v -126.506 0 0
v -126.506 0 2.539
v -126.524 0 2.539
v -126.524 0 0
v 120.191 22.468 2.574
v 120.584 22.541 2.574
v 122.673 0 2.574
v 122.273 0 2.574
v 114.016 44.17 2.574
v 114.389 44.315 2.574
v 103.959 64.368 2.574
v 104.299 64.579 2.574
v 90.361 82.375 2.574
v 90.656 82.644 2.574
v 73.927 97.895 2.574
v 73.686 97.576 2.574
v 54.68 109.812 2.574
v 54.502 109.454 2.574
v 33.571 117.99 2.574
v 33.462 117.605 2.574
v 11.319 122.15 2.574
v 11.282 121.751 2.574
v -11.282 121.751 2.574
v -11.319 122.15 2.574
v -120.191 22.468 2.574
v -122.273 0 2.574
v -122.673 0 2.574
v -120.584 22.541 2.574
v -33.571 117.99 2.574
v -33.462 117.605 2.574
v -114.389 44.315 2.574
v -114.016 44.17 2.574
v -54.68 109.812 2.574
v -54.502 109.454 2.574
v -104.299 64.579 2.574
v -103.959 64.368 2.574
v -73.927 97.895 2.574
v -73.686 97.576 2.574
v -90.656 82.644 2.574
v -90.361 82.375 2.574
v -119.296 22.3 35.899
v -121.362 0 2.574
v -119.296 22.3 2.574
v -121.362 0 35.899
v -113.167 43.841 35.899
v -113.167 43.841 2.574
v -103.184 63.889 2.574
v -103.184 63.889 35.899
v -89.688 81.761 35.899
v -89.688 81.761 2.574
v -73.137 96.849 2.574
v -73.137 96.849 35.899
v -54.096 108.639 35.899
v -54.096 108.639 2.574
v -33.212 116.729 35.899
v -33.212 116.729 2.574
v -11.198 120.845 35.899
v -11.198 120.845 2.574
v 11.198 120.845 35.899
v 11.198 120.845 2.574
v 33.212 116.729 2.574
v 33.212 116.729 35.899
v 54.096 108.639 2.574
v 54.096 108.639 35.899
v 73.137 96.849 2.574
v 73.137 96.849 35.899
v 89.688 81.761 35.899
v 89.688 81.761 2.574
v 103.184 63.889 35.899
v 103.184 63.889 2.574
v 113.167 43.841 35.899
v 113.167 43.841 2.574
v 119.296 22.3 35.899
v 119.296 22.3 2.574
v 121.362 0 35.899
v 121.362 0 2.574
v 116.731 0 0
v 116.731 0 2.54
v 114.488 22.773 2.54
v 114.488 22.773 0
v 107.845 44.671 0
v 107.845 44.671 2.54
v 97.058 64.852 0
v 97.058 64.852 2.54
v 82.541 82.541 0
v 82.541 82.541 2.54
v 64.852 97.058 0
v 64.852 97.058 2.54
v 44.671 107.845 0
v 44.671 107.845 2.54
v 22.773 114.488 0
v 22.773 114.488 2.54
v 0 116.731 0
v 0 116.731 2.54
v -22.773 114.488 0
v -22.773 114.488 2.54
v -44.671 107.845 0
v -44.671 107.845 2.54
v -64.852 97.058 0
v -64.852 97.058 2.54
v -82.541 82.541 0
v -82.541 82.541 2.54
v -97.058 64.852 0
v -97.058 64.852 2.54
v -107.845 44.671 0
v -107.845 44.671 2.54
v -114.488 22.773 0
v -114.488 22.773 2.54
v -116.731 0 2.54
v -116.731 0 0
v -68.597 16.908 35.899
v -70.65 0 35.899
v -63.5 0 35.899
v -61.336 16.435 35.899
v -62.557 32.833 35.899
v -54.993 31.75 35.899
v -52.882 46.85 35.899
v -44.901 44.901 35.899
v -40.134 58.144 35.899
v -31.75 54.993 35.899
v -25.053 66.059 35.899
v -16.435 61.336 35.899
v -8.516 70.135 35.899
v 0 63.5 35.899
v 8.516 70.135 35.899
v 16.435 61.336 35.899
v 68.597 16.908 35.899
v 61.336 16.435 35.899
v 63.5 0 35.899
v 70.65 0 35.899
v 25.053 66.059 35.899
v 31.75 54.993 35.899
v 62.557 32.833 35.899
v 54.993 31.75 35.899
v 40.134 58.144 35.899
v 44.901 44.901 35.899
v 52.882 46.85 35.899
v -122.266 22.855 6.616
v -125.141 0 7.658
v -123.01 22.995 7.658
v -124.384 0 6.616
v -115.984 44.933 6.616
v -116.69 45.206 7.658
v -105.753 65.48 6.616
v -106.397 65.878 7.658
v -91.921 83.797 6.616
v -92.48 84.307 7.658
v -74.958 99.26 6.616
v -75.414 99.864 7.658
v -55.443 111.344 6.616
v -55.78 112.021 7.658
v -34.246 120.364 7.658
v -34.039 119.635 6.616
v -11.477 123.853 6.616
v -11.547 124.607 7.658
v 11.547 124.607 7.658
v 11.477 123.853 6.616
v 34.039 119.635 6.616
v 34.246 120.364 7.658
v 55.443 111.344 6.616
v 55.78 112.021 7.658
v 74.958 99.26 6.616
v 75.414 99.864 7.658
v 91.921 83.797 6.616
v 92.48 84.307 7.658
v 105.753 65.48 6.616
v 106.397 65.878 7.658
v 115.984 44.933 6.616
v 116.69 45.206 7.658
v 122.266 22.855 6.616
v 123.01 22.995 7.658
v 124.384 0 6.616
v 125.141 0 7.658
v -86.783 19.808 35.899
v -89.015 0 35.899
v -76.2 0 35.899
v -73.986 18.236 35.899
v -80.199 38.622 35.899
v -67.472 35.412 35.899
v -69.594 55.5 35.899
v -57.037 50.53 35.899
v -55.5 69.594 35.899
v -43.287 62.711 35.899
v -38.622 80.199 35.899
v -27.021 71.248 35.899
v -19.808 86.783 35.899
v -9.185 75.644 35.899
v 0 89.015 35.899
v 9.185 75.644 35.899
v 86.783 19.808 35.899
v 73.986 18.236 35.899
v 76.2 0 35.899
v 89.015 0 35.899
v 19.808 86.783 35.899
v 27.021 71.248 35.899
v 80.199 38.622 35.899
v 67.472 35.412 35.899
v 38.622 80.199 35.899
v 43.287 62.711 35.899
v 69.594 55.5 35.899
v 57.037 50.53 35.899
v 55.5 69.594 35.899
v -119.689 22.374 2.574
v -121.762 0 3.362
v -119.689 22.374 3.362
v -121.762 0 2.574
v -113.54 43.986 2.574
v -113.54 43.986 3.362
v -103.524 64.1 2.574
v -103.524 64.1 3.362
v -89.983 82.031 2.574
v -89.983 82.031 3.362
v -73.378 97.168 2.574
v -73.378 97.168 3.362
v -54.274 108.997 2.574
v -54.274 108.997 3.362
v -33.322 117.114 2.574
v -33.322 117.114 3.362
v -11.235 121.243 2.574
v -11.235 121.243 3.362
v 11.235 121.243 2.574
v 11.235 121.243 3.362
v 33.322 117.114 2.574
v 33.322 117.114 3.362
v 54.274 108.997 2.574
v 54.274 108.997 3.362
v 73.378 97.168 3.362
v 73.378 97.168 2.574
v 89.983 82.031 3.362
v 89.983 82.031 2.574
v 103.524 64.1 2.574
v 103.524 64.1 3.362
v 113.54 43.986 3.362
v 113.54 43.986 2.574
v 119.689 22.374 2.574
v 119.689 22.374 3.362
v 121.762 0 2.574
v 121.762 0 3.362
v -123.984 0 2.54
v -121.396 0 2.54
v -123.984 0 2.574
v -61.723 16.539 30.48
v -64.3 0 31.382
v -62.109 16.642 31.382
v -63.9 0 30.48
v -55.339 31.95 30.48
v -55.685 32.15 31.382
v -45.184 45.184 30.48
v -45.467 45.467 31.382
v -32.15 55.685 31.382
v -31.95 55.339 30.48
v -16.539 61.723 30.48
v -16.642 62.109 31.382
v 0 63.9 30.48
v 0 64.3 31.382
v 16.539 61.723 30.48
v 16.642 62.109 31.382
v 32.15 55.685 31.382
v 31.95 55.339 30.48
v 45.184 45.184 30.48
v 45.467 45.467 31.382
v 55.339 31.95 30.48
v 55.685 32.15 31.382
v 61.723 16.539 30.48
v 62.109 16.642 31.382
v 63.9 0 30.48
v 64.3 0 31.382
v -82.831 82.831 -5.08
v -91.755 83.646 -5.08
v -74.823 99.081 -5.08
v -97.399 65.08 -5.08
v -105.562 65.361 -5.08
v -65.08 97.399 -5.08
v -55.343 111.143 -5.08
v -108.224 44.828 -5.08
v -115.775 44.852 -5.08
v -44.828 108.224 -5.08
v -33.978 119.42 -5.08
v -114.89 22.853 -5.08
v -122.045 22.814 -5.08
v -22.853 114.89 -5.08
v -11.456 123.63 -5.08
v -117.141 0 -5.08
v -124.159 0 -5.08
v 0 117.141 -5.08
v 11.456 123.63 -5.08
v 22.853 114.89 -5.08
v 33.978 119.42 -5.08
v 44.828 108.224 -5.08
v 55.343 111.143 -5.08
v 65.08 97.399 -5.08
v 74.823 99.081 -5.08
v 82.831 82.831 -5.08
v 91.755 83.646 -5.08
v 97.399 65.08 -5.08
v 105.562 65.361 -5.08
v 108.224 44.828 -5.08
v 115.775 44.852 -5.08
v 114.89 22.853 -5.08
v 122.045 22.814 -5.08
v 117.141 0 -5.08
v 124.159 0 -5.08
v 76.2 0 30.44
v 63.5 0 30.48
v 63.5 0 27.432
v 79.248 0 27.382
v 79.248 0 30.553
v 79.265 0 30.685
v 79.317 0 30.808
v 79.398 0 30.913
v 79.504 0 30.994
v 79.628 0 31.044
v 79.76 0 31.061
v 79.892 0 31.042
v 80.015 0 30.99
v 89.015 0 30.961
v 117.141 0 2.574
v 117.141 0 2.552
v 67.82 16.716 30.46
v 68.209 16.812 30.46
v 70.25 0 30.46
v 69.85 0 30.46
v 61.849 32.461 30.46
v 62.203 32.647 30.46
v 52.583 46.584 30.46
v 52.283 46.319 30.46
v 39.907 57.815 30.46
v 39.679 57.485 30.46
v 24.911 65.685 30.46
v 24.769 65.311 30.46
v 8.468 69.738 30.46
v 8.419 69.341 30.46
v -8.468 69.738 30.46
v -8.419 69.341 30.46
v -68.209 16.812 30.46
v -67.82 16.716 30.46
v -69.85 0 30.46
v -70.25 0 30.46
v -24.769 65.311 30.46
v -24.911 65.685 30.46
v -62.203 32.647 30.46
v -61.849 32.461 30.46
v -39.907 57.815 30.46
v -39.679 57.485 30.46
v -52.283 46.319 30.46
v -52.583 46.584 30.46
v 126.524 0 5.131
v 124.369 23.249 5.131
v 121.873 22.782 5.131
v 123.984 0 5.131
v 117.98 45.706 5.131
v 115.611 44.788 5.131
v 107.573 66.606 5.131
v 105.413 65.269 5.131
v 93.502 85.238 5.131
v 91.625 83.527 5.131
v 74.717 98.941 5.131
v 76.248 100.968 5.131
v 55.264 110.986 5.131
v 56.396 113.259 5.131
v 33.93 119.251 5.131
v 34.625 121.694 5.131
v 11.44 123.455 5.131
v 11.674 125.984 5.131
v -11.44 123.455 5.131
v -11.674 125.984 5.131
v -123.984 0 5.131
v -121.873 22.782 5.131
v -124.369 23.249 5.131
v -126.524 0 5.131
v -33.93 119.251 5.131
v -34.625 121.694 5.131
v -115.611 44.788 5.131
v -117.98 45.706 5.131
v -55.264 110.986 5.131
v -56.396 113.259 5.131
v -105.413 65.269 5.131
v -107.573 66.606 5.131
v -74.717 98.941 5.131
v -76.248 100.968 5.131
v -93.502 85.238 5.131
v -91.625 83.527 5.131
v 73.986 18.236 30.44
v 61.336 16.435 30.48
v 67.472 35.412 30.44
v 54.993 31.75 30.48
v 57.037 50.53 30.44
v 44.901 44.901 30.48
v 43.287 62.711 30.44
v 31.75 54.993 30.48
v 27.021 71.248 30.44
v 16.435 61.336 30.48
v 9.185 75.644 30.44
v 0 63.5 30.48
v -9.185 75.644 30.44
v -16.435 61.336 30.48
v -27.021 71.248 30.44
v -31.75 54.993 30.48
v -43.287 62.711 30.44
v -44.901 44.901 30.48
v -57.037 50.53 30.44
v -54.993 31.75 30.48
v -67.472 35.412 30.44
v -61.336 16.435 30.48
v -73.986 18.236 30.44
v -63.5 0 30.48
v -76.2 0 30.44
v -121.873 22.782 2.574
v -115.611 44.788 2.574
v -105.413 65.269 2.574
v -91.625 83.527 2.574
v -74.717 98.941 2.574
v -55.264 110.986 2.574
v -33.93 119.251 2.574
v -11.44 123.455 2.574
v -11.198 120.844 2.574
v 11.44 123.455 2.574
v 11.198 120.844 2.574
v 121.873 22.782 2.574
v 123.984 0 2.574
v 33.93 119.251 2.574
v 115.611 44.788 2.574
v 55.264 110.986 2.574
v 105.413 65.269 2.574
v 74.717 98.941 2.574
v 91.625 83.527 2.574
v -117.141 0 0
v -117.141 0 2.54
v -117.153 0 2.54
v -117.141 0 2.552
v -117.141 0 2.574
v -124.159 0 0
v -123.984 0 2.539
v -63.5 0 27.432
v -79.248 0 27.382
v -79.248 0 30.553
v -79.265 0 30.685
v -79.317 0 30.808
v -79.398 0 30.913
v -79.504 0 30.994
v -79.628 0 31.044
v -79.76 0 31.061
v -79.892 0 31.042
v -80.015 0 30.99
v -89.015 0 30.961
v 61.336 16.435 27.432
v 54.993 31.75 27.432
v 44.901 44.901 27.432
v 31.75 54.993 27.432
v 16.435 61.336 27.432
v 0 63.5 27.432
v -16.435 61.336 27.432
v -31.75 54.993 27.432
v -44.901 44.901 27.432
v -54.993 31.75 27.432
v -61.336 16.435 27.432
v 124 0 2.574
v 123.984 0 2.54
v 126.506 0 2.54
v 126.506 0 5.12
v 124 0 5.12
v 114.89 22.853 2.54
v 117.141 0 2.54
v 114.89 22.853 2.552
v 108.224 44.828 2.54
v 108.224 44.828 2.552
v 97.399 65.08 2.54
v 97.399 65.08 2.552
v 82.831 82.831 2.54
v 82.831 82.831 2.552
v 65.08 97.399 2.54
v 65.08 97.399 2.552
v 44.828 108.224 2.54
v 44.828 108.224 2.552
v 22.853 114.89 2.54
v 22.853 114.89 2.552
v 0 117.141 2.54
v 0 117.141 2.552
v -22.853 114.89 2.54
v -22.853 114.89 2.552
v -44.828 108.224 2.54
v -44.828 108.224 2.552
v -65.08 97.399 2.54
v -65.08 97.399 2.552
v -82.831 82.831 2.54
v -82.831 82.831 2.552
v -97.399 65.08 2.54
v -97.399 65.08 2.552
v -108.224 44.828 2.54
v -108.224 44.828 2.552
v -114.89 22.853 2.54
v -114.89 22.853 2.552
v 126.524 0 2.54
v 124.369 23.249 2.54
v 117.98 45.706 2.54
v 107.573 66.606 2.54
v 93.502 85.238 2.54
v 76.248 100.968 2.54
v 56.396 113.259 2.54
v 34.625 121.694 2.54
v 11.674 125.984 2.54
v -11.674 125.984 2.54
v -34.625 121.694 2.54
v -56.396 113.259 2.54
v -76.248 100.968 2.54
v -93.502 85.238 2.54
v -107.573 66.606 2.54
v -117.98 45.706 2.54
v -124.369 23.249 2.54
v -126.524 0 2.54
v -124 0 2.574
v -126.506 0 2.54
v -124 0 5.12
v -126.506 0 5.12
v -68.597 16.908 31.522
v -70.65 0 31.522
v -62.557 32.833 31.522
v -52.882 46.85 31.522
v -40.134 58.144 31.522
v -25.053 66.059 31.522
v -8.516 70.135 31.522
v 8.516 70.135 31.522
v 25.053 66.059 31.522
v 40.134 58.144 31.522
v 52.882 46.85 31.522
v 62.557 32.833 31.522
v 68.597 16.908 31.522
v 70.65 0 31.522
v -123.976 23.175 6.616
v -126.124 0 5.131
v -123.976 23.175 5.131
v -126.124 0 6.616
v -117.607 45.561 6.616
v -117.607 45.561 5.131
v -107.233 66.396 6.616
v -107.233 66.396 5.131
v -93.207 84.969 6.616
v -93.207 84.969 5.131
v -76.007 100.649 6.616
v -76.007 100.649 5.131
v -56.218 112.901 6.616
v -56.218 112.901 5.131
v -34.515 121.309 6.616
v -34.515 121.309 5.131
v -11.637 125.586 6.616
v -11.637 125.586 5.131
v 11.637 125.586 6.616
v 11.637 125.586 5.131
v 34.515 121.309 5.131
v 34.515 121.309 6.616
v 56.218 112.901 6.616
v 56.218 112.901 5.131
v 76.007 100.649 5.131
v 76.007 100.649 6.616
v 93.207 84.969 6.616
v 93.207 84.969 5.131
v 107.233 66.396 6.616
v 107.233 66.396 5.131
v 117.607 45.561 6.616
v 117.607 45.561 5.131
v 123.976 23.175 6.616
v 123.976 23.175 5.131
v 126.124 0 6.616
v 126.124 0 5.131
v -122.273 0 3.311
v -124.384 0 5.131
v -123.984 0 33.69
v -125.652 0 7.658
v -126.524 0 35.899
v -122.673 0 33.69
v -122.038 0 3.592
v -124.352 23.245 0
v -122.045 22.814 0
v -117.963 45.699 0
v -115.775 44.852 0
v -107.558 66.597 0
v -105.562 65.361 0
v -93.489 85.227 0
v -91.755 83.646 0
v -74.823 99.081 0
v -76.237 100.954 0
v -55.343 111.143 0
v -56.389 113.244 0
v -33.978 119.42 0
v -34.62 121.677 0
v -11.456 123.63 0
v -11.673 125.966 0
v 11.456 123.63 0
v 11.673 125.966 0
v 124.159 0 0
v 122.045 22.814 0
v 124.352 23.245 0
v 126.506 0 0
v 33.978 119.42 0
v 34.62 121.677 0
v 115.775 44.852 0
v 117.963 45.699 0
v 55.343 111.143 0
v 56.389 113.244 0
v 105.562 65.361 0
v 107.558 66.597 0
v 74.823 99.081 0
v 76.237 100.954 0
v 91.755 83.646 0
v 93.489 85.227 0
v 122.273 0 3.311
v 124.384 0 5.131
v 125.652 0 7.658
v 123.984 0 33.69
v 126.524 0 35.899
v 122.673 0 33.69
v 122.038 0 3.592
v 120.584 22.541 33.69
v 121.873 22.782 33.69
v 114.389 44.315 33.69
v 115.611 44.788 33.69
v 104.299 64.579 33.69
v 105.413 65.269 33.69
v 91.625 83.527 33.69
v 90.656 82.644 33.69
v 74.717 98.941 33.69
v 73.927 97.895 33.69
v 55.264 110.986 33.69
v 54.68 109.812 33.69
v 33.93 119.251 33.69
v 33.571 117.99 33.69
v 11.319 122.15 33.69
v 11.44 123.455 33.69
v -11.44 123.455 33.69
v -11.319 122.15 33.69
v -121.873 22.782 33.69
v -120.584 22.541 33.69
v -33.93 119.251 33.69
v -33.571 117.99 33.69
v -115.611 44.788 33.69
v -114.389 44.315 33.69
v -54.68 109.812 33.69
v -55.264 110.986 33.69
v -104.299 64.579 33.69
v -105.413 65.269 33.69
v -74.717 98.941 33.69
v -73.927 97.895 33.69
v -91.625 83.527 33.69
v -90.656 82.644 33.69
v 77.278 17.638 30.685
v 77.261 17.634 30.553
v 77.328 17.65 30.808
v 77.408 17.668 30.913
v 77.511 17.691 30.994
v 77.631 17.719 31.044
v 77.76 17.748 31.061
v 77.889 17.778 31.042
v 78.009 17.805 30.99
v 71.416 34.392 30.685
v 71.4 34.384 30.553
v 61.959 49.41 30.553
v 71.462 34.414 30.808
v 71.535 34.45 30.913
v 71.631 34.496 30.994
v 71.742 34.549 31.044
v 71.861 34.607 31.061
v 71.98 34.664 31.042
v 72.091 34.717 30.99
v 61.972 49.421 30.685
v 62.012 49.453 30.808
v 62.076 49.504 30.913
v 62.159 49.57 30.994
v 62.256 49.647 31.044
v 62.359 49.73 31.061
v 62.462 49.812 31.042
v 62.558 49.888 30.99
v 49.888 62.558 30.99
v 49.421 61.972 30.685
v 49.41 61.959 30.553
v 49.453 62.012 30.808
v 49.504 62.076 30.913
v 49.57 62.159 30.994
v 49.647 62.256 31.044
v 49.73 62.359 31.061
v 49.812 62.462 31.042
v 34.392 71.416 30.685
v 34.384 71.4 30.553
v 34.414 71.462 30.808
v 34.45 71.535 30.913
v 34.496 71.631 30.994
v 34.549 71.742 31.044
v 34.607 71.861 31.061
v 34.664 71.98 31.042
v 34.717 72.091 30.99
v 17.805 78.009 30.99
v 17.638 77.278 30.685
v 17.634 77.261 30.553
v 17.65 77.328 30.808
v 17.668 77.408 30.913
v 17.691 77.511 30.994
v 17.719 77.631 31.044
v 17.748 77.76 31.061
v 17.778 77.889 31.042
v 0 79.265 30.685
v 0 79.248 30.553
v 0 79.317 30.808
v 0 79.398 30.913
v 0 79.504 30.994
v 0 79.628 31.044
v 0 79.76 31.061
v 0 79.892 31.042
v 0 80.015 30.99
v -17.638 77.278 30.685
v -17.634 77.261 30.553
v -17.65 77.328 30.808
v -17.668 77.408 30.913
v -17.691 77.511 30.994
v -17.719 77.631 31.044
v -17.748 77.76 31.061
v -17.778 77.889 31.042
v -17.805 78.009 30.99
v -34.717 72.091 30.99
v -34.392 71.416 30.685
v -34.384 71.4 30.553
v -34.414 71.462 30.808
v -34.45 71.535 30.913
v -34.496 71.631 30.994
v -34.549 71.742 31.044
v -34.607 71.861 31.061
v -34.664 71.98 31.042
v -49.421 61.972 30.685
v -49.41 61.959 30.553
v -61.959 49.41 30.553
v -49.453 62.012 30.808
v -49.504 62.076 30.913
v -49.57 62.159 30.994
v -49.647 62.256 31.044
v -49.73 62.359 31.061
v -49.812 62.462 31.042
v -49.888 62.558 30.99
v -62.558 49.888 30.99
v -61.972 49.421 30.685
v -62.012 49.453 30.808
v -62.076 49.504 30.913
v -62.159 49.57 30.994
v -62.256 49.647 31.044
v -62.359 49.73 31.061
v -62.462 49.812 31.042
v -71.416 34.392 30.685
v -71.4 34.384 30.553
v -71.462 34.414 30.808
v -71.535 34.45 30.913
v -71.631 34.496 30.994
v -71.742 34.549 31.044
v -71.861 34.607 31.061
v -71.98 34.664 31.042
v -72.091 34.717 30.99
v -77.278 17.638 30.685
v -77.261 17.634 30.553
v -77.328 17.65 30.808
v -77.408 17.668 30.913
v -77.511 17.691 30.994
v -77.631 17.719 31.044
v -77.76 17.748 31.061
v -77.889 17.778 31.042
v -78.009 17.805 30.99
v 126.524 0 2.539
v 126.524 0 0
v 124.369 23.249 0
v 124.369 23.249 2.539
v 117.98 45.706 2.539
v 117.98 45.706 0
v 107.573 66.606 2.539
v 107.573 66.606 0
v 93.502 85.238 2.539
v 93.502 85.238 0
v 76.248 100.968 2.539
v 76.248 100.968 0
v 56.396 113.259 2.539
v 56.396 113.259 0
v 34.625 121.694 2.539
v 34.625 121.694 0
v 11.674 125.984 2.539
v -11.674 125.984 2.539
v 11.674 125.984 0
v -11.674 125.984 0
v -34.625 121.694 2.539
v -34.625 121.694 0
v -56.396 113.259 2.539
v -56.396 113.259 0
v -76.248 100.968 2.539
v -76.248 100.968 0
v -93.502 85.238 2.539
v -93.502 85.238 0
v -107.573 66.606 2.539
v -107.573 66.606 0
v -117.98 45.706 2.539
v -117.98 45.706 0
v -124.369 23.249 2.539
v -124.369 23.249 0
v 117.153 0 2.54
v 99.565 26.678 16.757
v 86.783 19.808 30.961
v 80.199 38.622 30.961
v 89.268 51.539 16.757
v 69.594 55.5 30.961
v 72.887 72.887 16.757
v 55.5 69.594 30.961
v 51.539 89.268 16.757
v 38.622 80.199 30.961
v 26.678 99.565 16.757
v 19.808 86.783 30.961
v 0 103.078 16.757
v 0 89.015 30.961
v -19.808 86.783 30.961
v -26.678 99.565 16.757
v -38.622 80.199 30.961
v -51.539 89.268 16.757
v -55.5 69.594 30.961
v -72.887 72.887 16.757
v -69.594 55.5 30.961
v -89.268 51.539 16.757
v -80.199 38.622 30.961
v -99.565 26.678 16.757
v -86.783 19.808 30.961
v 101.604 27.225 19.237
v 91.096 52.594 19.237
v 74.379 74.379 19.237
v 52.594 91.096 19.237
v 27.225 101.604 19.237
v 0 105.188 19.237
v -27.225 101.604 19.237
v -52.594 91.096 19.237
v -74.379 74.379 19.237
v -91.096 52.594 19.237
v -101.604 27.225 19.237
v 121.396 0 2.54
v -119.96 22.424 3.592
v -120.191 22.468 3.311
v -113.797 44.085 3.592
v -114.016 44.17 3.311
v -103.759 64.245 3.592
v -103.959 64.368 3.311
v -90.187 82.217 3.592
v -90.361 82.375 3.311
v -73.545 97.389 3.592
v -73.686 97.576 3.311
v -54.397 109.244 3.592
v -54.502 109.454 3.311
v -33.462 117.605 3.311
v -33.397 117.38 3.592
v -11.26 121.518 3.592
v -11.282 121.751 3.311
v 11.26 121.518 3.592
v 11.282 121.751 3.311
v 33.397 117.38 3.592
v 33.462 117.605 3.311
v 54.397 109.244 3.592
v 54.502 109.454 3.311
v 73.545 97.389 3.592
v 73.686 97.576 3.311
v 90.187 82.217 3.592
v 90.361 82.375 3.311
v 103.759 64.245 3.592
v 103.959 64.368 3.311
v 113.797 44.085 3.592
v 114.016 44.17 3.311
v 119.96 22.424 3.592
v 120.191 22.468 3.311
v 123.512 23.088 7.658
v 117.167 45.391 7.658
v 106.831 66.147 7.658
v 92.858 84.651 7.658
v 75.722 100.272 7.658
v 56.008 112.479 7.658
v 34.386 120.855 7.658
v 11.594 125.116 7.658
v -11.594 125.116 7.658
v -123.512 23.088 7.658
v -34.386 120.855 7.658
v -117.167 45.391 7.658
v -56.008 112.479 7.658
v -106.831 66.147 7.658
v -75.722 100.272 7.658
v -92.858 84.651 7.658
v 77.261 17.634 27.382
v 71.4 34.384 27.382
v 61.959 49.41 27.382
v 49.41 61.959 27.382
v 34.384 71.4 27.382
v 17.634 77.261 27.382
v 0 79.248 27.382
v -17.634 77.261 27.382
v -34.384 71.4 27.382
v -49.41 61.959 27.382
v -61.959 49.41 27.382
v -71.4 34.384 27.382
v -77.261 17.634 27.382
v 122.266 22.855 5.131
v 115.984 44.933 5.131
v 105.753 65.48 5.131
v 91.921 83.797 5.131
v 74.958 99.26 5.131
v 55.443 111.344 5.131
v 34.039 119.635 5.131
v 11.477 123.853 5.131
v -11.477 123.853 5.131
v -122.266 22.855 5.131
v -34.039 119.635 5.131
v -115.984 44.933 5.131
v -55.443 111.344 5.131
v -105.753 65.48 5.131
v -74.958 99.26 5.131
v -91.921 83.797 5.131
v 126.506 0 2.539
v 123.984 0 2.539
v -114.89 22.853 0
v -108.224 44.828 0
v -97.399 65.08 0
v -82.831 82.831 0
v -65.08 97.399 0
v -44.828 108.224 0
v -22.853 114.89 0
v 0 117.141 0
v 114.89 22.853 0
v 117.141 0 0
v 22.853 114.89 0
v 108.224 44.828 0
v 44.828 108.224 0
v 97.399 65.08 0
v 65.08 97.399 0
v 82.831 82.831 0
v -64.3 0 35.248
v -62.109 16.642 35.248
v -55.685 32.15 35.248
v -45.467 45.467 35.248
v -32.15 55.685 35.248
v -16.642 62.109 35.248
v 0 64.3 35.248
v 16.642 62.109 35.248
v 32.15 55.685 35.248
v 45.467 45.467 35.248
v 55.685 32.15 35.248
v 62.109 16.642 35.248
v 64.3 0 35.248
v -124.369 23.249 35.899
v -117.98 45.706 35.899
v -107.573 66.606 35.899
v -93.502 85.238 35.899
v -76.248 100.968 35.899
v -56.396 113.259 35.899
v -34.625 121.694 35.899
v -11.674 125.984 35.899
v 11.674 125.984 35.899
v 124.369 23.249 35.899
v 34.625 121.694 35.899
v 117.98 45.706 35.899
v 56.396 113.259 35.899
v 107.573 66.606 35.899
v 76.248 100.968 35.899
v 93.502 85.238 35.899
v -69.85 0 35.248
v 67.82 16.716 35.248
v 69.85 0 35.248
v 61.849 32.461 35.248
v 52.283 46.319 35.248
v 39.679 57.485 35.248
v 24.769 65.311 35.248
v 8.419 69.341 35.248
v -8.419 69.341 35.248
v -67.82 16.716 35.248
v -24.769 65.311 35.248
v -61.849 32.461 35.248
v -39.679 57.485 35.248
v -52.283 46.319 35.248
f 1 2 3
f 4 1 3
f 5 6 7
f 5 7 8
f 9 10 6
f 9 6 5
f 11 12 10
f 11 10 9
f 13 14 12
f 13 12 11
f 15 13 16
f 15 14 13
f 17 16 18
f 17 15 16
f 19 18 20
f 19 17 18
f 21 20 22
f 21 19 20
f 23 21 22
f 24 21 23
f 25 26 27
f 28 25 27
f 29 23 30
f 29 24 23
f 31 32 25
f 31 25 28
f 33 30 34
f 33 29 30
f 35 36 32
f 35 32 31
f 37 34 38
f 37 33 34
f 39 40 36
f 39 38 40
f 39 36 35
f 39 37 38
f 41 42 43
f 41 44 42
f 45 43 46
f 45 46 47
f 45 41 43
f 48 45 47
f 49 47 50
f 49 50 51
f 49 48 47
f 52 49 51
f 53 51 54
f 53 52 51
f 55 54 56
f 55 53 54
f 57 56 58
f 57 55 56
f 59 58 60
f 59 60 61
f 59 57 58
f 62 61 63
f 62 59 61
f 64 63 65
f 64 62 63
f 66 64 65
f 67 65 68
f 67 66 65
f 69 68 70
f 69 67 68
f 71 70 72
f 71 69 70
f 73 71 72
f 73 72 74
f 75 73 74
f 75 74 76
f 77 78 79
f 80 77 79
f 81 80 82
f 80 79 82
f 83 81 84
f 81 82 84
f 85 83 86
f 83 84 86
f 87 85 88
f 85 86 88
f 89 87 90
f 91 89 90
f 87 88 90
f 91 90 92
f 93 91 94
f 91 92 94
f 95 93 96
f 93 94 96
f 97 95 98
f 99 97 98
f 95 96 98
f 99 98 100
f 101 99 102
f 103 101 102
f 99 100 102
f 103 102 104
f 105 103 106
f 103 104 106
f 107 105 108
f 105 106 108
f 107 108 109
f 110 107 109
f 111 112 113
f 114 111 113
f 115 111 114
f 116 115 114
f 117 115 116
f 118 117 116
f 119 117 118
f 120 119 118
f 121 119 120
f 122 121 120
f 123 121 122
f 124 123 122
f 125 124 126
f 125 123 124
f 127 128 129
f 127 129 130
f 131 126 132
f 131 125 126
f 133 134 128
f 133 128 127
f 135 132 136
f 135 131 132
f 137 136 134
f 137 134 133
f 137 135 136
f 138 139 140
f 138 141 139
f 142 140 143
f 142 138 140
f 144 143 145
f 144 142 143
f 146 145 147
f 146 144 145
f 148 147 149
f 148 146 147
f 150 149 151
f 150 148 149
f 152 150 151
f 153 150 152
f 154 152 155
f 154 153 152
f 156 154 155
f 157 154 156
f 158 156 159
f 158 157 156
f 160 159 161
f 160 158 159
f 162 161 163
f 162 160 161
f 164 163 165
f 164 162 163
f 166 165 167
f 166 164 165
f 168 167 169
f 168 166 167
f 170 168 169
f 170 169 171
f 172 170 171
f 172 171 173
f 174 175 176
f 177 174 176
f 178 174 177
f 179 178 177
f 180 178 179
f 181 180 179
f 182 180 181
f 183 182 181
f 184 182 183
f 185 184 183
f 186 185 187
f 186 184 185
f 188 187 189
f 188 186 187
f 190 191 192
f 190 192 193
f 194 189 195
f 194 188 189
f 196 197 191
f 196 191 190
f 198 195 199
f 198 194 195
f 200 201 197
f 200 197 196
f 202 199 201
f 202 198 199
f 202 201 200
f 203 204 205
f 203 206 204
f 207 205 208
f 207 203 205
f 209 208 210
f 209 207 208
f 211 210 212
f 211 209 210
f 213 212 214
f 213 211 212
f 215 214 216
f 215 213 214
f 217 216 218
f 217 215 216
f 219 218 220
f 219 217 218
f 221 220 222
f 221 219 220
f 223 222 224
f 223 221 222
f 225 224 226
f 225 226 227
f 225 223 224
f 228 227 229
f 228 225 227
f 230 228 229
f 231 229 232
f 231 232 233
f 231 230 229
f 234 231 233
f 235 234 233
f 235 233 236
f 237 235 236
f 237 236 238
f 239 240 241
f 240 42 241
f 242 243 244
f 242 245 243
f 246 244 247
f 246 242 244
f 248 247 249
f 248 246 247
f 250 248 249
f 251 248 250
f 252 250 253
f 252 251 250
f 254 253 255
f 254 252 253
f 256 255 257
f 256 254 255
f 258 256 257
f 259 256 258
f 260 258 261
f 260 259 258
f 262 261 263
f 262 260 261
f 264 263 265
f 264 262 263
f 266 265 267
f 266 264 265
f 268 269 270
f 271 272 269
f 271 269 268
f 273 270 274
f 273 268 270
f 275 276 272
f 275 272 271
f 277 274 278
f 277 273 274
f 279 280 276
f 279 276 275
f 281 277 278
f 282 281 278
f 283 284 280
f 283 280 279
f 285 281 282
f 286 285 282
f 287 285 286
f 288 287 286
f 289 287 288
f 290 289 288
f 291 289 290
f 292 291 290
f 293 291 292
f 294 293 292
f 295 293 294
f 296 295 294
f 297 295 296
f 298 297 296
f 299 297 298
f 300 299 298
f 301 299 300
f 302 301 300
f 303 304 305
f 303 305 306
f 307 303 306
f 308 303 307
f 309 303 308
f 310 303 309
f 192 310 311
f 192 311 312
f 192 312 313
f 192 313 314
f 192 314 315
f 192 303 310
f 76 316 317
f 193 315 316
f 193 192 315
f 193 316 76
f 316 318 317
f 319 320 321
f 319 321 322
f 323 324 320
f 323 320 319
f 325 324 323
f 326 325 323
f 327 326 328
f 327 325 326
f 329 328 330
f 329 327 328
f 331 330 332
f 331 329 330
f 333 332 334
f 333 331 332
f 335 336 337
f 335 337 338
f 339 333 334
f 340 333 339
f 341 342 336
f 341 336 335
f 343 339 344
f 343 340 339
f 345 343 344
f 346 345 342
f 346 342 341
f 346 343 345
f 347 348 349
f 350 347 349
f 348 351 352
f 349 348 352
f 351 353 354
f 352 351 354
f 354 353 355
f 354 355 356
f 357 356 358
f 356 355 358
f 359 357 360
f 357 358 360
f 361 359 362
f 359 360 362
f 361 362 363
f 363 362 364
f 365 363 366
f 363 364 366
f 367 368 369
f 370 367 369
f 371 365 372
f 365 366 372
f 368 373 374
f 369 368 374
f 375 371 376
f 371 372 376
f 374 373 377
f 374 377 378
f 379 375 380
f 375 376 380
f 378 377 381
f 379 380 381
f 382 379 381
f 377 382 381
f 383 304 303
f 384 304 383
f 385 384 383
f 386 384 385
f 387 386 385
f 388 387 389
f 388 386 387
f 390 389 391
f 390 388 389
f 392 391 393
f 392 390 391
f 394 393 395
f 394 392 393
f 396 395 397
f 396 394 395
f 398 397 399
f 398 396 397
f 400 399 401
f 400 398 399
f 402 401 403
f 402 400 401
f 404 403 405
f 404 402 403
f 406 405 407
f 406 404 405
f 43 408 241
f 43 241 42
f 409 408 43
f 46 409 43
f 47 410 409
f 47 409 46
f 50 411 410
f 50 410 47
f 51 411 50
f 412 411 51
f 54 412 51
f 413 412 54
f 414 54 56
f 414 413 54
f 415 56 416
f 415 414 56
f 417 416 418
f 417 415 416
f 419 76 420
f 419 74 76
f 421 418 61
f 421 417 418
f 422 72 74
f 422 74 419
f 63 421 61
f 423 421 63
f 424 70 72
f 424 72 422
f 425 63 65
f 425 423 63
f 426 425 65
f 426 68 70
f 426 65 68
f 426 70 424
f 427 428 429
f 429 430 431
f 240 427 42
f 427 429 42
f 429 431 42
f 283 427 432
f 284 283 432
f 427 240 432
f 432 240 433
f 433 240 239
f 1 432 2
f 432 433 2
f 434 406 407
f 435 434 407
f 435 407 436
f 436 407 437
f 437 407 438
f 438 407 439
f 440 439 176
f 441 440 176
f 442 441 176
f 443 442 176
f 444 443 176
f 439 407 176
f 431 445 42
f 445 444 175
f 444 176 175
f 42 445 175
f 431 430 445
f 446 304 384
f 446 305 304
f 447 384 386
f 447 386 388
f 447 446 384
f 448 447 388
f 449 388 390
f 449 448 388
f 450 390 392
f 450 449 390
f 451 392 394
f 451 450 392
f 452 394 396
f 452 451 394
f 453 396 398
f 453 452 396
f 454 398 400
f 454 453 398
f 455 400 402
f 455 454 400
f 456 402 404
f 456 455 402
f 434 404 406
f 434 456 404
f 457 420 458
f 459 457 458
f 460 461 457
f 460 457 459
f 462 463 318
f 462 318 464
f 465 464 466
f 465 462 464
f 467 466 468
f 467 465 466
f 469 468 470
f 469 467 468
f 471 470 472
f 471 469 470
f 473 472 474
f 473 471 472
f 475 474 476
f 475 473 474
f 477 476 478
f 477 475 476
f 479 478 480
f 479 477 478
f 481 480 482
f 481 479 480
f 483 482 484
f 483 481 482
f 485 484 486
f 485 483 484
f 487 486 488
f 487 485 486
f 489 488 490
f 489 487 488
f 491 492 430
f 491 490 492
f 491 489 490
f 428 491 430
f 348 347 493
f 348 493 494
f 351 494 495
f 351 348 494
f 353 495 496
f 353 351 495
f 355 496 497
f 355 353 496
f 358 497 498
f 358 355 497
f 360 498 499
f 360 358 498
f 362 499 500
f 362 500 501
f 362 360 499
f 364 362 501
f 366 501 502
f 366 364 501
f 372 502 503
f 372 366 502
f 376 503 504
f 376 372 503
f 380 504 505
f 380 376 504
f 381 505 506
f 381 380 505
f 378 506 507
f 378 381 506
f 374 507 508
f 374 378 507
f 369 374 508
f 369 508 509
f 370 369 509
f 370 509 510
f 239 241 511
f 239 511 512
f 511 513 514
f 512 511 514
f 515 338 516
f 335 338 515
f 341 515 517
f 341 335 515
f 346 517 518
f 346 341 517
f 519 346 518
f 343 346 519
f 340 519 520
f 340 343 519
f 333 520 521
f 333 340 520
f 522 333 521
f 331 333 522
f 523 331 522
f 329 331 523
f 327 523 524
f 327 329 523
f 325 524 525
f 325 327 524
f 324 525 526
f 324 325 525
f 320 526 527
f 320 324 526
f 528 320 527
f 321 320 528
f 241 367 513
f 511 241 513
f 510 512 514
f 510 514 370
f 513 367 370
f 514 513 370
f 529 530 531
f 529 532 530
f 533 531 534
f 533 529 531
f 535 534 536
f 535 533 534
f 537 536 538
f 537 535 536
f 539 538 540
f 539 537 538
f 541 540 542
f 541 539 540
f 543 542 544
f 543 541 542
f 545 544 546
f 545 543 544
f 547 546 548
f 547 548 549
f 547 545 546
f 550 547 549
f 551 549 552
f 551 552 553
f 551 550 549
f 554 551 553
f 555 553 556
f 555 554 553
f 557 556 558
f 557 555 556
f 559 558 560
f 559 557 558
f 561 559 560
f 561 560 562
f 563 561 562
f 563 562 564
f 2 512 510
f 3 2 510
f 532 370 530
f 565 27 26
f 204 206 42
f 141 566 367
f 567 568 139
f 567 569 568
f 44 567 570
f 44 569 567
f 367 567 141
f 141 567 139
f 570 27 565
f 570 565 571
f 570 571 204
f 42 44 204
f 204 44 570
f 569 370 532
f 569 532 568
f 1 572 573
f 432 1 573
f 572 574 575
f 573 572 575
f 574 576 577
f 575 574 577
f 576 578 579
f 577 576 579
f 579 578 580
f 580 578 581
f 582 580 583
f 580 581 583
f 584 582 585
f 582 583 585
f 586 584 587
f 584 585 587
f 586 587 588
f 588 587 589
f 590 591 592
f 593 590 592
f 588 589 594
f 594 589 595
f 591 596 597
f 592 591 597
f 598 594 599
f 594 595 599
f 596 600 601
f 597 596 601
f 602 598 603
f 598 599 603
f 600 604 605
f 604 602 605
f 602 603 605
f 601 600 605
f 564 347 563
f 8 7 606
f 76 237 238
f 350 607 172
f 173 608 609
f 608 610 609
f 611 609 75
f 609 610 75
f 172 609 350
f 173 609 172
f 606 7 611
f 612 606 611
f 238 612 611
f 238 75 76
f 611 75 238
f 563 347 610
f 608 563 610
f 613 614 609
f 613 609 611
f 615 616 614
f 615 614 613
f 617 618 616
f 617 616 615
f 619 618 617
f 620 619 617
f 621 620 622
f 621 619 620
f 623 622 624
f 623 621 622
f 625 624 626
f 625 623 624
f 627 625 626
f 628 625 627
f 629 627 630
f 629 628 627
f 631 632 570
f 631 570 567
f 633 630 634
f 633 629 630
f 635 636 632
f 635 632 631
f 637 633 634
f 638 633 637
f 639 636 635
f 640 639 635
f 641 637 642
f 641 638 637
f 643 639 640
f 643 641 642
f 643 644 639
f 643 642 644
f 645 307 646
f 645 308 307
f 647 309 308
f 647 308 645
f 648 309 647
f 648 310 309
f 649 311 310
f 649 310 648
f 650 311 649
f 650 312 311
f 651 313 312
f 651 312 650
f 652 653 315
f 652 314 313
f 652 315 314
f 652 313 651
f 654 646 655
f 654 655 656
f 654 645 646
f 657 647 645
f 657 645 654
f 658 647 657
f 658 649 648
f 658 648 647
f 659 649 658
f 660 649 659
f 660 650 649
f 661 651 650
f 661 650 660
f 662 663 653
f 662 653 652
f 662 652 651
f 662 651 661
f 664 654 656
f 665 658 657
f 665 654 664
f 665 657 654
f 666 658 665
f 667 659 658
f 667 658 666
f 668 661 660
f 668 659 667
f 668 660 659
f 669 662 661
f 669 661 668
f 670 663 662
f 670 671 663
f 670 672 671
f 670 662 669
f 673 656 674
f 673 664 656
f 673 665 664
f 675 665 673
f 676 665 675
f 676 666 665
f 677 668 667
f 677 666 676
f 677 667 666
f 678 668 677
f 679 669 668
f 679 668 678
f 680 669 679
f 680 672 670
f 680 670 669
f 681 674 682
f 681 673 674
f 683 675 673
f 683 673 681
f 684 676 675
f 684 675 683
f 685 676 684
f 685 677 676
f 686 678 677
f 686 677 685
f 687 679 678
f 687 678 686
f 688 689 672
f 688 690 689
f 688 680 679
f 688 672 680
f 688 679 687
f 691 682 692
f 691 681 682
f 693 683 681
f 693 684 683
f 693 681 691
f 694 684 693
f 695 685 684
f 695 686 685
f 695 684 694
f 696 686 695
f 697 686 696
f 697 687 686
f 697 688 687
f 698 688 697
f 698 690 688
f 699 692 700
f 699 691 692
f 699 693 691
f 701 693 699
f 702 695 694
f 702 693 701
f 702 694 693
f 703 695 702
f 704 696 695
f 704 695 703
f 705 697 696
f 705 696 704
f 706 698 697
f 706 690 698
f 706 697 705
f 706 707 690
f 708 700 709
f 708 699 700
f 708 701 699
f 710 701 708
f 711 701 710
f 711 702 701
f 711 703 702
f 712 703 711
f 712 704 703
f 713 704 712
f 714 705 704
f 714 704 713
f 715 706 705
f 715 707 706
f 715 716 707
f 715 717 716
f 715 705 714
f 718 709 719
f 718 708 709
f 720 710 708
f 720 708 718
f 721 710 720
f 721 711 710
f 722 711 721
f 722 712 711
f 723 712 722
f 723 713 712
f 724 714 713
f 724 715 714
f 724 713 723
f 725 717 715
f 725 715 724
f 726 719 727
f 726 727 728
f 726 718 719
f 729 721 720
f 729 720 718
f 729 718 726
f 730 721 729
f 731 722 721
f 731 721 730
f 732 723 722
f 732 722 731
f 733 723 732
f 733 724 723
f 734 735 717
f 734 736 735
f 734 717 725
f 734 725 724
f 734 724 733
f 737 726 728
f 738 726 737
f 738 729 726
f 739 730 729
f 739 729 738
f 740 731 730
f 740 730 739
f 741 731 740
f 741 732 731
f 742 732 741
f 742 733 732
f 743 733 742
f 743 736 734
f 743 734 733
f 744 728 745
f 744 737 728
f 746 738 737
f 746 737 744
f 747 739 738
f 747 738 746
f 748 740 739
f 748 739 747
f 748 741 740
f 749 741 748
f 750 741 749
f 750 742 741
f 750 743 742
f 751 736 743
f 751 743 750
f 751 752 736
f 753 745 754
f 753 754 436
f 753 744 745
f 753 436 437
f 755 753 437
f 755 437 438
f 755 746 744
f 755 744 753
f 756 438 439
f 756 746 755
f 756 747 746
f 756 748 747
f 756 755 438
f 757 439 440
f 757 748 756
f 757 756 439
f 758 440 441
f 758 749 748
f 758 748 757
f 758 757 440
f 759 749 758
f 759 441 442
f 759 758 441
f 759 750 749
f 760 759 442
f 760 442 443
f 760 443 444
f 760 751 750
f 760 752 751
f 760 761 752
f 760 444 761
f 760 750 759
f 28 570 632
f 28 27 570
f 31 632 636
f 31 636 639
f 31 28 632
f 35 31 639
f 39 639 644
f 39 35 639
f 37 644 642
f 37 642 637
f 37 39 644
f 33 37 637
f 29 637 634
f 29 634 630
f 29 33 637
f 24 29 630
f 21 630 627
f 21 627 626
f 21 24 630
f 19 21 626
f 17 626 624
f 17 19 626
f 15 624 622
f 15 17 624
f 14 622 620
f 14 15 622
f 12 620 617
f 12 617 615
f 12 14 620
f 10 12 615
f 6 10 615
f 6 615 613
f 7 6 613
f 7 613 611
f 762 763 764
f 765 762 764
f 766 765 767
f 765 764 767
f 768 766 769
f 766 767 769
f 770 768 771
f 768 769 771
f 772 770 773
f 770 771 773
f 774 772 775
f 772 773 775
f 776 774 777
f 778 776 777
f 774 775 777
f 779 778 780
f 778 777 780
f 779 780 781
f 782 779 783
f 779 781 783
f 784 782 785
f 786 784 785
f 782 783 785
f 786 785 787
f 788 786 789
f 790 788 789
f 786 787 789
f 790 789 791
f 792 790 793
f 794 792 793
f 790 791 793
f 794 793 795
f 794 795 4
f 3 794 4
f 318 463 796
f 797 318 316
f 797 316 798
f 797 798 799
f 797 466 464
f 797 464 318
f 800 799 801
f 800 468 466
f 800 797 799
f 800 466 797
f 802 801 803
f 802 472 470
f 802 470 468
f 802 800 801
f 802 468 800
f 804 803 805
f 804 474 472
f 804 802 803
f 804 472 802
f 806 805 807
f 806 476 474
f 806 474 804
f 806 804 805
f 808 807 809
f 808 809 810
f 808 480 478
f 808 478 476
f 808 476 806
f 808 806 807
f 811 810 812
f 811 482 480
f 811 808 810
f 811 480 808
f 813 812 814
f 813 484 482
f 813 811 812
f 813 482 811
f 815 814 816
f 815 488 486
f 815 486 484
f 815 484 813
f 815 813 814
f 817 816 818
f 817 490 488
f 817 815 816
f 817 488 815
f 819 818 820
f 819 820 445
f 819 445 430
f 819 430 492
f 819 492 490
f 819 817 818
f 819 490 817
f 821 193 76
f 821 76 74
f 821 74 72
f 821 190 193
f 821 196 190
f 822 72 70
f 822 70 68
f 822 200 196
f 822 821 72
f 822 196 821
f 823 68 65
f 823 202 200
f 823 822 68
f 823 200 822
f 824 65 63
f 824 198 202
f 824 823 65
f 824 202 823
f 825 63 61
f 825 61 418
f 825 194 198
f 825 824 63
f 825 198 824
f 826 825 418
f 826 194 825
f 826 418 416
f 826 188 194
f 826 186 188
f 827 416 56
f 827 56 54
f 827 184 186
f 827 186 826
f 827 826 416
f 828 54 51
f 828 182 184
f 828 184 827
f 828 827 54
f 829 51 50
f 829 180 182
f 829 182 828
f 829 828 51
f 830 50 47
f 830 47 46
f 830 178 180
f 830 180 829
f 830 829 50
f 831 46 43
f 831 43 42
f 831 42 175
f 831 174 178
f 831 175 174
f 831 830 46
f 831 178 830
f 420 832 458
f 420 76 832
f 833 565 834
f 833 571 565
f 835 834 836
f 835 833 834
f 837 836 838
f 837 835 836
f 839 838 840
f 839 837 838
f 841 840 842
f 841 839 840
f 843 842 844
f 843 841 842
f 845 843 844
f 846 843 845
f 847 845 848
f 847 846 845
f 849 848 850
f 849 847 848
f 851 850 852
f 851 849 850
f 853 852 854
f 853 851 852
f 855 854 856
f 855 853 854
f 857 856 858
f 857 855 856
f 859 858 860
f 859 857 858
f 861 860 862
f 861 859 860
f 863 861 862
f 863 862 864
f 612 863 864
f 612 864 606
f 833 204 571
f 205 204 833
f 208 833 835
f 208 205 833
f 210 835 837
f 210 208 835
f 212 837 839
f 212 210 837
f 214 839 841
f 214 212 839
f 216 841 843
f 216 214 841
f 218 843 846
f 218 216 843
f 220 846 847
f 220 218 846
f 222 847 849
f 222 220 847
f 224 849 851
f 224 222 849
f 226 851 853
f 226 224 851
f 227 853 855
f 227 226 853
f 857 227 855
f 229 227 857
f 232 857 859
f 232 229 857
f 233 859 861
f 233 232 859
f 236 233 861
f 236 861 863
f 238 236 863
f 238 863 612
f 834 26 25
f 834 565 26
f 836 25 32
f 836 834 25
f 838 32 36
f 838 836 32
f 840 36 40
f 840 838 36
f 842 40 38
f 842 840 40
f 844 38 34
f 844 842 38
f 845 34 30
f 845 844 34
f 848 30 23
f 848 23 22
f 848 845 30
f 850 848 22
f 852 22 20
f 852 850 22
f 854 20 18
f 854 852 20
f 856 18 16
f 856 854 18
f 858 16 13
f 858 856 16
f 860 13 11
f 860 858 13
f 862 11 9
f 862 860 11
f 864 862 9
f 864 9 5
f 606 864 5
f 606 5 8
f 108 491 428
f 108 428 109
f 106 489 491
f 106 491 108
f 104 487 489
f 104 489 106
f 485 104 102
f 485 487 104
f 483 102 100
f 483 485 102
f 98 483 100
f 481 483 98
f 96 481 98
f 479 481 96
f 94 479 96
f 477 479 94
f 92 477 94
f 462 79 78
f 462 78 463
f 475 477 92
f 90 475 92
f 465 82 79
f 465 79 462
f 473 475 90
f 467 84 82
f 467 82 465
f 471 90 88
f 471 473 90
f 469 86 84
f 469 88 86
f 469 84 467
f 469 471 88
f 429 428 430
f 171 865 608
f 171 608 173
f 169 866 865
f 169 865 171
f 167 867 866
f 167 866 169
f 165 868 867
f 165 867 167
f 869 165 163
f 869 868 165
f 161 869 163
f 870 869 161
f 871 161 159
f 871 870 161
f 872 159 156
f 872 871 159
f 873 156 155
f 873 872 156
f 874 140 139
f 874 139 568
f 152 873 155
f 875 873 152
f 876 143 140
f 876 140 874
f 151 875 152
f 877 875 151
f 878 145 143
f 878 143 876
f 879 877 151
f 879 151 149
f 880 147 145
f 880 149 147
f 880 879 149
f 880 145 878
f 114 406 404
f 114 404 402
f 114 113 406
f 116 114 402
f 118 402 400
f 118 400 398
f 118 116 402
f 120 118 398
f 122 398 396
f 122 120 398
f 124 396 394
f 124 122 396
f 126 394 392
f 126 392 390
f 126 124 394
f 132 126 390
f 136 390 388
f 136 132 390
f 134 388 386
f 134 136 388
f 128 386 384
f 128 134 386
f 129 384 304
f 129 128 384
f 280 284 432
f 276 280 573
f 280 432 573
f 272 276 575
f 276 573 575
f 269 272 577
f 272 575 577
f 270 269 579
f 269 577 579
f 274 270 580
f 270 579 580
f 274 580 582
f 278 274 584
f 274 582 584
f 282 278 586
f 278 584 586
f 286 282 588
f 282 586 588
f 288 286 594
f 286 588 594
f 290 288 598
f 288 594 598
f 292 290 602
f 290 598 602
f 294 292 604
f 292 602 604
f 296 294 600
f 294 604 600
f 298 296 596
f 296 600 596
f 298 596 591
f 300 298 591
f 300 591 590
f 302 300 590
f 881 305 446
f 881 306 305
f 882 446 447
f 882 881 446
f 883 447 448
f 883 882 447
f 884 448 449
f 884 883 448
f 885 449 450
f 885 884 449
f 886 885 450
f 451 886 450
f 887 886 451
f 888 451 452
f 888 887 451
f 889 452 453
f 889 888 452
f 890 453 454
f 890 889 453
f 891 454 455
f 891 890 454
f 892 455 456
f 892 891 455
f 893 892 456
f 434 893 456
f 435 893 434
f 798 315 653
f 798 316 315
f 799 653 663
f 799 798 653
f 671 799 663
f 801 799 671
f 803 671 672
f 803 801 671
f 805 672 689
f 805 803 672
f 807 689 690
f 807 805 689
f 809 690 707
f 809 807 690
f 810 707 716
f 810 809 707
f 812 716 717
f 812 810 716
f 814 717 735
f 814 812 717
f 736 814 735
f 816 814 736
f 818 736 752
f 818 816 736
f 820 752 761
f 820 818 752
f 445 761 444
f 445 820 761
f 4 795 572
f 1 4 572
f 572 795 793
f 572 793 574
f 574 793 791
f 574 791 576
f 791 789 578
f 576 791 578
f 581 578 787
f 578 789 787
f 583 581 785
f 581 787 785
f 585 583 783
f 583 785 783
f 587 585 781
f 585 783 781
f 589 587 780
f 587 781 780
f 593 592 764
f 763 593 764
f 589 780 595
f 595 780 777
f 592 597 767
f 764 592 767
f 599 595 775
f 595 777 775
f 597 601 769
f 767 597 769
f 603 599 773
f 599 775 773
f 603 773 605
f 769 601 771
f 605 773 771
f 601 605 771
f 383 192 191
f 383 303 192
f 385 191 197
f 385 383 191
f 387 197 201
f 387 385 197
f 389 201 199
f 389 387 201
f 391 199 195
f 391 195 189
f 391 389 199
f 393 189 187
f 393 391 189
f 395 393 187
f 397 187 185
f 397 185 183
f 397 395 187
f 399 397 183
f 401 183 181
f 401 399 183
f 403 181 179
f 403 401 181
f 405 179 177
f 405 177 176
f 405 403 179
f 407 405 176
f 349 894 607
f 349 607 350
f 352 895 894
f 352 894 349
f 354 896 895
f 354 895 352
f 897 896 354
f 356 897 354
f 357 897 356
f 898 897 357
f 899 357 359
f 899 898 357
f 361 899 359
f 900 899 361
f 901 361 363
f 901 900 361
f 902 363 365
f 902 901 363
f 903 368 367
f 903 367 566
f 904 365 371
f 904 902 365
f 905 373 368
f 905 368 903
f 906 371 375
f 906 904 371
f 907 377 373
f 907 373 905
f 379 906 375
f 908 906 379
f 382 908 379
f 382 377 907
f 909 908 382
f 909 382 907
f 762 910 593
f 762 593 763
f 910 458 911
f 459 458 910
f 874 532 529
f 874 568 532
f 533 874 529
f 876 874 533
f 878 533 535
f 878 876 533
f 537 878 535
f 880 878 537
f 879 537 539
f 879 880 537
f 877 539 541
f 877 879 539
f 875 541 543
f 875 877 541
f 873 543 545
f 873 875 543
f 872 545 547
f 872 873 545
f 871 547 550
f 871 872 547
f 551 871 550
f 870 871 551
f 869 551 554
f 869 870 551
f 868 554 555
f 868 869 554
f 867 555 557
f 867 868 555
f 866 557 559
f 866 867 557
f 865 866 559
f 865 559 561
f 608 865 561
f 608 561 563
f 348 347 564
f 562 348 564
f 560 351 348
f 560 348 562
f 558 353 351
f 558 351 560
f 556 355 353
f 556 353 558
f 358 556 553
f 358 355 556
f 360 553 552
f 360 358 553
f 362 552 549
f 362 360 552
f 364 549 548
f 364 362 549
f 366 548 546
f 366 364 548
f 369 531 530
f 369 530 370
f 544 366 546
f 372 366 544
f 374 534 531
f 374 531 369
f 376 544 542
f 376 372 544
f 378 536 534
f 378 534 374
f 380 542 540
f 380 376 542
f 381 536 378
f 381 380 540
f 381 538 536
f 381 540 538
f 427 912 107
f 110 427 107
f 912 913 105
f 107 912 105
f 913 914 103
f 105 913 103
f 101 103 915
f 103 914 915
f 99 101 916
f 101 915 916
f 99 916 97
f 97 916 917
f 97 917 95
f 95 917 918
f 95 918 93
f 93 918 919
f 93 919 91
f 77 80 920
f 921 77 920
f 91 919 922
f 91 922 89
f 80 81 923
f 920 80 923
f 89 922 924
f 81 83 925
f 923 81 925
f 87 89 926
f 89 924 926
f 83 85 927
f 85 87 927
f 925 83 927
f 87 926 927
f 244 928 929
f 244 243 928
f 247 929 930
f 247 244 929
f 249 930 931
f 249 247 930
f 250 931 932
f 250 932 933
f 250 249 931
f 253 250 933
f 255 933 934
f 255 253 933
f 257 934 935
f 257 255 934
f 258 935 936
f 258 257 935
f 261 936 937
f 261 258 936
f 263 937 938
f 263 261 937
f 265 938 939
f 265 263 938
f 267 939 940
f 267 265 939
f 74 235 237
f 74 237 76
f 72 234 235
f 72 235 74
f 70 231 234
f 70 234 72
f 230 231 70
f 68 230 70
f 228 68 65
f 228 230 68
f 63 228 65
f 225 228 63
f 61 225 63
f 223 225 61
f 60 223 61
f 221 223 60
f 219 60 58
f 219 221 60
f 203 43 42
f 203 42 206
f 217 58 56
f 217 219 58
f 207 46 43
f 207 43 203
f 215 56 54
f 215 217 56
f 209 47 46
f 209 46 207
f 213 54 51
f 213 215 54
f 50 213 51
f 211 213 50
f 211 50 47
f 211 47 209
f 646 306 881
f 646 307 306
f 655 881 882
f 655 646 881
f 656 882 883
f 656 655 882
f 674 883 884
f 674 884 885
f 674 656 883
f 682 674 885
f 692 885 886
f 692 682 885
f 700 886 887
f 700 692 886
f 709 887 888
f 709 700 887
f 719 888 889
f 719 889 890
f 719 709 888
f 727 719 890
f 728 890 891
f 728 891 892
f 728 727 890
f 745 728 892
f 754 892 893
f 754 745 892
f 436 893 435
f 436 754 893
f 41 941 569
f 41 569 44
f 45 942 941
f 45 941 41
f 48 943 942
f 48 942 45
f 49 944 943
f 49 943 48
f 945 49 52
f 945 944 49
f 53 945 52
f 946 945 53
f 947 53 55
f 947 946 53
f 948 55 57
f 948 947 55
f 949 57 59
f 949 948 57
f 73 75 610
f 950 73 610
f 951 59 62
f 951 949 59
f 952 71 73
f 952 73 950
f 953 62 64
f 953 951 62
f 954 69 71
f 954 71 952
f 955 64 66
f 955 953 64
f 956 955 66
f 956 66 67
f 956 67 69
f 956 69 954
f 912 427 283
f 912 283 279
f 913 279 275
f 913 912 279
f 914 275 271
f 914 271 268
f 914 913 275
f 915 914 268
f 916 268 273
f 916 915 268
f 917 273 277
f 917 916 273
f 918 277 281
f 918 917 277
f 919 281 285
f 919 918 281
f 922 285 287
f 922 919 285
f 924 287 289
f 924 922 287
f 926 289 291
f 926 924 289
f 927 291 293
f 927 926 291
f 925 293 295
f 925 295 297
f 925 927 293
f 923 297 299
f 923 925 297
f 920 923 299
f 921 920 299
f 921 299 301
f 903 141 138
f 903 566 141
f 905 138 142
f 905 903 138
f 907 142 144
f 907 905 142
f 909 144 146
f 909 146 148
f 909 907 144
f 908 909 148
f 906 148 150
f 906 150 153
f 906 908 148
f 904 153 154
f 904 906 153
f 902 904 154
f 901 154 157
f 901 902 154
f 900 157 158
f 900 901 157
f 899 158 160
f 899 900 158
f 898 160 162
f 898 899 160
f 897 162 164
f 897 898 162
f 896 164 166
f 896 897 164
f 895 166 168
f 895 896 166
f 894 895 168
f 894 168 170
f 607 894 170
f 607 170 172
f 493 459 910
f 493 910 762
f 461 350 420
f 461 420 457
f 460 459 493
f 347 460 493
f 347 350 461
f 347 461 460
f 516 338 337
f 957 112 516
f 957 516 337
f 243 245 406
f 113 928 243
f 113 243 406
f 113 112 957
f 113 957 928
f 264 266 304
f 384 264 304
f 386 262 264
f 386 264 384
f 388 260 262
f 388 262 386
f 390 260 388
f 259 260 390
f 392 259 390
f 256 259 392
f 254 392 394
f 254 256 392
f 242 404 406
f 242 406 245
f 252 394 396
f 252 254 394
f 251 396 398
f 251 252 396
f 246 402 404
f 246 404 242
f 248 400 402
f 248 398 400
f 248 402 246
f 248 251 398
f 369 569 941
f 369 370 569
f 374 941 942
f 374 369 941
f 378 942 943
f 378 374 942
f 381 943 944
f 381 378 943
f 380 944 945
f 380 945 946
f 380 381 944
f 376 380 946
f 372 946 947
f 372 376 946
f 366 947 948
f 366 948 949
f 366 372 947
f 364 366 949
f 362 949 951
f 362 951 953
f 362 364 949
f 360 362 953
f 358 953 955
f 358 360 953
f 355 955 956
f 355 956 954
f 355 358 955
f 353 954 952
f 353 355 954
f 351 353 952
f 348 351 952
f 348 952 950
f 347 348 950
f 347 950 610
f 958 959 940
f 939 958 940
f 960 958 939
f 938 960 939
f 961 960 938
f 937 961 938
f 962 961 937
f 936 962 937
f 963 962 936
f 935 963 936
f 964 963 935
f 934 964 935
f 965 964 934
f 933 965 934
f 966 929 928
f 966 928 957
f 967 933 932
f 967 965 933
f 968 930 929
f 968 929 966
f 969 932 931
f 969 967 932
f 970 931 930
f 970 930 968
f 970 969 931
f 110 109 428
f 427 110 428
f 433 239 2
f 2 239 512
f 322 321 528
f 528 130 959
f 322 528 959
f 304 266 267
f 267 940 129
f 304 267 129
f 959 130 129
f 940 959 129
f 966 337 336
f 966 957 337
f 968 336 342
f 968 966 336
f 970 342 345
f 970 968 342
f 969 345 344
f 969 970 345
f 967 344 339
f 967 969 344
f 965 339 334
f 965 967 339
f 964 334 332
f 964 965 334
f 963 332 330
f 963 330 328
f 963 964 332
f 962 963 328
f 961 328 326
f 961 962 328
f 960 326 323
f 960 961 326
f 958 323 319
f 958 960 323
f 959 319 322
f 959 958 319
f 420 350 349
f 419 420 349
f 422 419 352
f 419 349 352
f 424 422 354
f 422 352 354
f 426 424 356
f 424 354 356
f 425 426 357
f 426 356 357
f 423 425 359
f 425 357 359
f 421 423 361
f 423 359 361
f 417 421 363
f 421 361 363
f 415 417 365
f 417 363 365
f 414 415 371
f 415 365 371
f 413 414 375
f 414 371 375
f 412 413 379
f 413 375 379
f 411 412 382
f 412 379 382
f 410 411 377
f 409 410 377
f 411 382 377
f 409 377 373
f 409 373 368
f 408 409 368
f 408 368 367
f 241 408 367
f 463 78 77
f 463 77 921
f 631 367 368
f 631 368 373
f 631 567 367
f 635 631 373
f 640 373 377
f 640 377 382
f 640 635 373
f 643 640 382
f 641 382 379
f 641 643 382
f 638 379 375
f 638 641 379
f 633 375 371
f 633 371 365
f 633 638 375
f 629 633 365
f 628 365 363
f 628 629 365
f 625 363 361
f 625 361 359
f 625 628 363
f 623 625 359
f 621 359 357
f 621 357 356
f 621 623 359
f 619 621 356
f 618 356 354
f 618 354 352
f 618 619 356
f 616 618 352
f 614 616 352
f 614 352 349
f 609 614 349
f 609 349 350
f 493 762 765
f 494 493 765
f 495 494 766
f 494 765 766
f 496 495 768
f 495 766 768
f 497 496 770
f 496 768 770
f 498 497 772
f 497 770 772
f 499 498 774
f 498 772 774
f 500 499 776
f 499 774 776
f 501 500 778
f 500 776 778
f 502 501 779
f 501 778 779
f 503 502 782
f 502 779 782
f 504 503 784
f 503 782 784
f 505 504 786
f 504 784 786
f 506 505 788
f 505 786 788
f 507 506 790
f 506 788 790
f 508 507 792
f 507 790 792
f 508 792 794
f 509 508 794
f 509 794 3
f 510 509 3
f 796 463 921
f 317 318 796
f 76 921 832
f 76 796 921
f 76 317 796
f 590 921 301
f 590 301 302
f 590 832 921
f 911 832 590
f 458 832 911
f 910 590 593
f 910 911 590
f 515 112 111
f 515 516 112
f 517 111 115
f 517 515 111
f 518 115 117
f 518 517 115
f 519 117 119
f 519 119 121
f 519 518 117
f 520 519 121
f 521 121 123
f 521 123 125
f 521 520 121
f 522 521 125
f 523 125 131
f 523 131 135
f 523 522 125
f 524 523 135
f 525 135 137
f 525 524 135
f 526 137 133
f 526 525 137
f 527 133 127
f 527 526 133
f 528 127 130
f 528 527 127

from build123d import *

# Parameters (mm, degrees)
F0_R      = 126.52371
F0_R_2    = 124.15936
F1_DEPTH  = 2.54
F2_R      = 124.15936
F2_R_2    = 117.14064
F3_DEPTH  = 5.08
F4_R      = 125.743209
F4_R_2    = 116.730939
F5_DEPTH  = 2.54
F6_W      = 349.577502
F6_H      = 219.862625
F7_DEPTH  = 152.4
F9_ANGLE  = 180
F10_W     = 2.54
F10_H     = 2.592745
F11_ANGLE = -180
F13_ANGLE = -180
F15_ANGLE = -180


with BuildPart() as f1:
    # F0 (on Top) → F1 (new body)
    with BuildSketch(Plane.XY):
        Circle(F0_R)
        Circle(F0_R_2, mode=Mode.SUBTRACT)
    extrude(amount=F1_DEPTH)


with BuildPart() as f3:
    # F2 (on face) → F3 (new body)
    with BuildSketch(Plane(origin=(0, 0, 0), x_dir=(1, 0, 0), z_dir=(0, 0, -1))):
        Circle(F2_R)
        Circle(F2_R_2, mode=Mode.SUBTRACT)
    extrude(amount=F3_DEPTH)


with BuildPart() as f5:
    # F4 (on face) → F5 (new body)
    with BuildSketch(Plane.XY.offset(2.54)):
        Circle(F4_R)
        Circle(F4_R_2, mode=Mode.SUBTRACT)
    extrude(amount=-F5_DEPTH)


with BuildPart() as f7_tool:
    # F6 (on Front) → F7 (new body)
    with BuildSketch(Plane.XZ):
        with Locations((13.366215, -9.95794)):
            Rectangle(F6_W, F6_H)
    extrude(amount=F7_DEPTH)


with BuildPart() as f1_1:
    add(f1.part)

    # F7: cut by f7_tool
    add(f7_tool.part, mode=Mode.SUBTRACT)



with BuildPart() as f3_1:
    add(f3.part)

    # F7: cut by f7_tool
    add(f7_tool.part, mode=Mode.SUBTRACT)



with BuildPart() as f5_1:
    add(f5.part)

    # F7: cut by f7_tool
    add(f7_tool.part, mode=Mode.SUBTRACT)


with BuildPart() as f3_2:
    add(f3_1.part)

    add(f5_1.part)  # F9 merges F5
    # F8 (on Front) → F9 (revolve)
    with BuildSketch(Plane.XZ):
        with BuildLine():
            Line((76.2, 30.439905), (63.500063, 30.480015))
            Line((63.500063, 30.480015), (63.5, 27.432))
            Line((63.5, 27.432), (79.248, 27.382263))
            Line((79.248, 27.382263), (79.248, 30.552636))
            ThreePointArc((79.248, 30.552636), (79.504396, 30.993951), (80.01477, 30.989788))
            Line((80.01477, 30.989788), (89.014673, 30.961363))
            Line((89.014673, 30.961363), (119.667187, 0))
            Line((119.667187, 0), (121.44371, 2.490375))
            Line((121.44371, 2.490375), (89.014673, 35.898866))
            Line((89.014673, 35.898866), (76.2, 35.898866))
            Line((76.2, 35.898866), (76.2, 30.439905))
        make_face()
    revolve(axis=Axis((0, 0, 15.24), (0, 0, 1)), revolution_arc=F9_ANGLE)


with BuildPart() as f11:
    # F10 (on Front) → F11 (revolve)
    with BuildSketch(Plane.XZ):
        with Locations((125.25371, 3.834921)):
            Rectangle(F10_W, F10_H)
    revolve(axis=Axis((0, 0, -9.371076), (0, 0, -1)), revolution_arc=F11_ANGLE)


with BuildPart() as f1_2:
    add(f1_1.part)

    add(f3_2.part)  # F13 merges F3

    add(f11.part)  # F13 merges F11
    # F12 (on face) → F13 (revolve)
    with BuildSketch(Plane.XZ):
        Polygon((117.14064, 2.574337), (117.14064, 0), (117.14064, -5.08), (124.15936, -5.08), (124.15936, 0), (126.506045, 0), (126.506045, 5.119951), (124.000214, 5.119951), (124.000214, 2.574337), align=None)
    revolve(axis=Axis((0, 0, -4.455078), (0, 0, -1)), revolution_arc=F13_ANGLE)


with BuildPart() as f15:
    # F14 (on face) → F15 (revolve)
    with BuildSketch(Plane.XZ):
        Polygon((-63.500063, 30.480015), (-63.500063, 35.898866), (-64.300063, 35.898866), (-69.850032, 35.898866), (-70.650032, 35.898866), (-70.650032, 31.521954), (-70.250032, 30.45996), (-69.850032, 30.45996), (-69.850032, 35.247635), (-64.300063, 35.247635), (-64.300063, 31.381838), (-63.900063, 30.480015), align=None)
        Polygon((-126.52371, 33.689883), (-126.52371, 5.131294), (-126.12371, 5.131294), (-126.12371, 6.615987), (-125.65191, 7.657902), (-125.140778, 7.657902), (-124.38371, 6.615987), (-124.38371, 5.131294), (-123.98371, 5.131294), (-123.98371, 33.689883), (-122.67296, 33.689883), (-122.67296, 2.574337), (-122.27296, 2.574337), (-122.27296, 3.31086), (-122.038392, 3.592338), (-121.76221, 3.362182), (-121.76221, 2.574337), (-121.36221, 2.574337), (-121.36221, 33.689883), (-121.36221, 35.898866), (-122.67296, 35.898866), (-123.98371, 35.898866), (-126.52371, 35.898866), align=None)
    revolve(axis=Axis((0, 0, 17.949433), (0, 0, 1)), revolution_arc=F15_ANGLE)


solid = Compound([f1_2.part, f15.part])
